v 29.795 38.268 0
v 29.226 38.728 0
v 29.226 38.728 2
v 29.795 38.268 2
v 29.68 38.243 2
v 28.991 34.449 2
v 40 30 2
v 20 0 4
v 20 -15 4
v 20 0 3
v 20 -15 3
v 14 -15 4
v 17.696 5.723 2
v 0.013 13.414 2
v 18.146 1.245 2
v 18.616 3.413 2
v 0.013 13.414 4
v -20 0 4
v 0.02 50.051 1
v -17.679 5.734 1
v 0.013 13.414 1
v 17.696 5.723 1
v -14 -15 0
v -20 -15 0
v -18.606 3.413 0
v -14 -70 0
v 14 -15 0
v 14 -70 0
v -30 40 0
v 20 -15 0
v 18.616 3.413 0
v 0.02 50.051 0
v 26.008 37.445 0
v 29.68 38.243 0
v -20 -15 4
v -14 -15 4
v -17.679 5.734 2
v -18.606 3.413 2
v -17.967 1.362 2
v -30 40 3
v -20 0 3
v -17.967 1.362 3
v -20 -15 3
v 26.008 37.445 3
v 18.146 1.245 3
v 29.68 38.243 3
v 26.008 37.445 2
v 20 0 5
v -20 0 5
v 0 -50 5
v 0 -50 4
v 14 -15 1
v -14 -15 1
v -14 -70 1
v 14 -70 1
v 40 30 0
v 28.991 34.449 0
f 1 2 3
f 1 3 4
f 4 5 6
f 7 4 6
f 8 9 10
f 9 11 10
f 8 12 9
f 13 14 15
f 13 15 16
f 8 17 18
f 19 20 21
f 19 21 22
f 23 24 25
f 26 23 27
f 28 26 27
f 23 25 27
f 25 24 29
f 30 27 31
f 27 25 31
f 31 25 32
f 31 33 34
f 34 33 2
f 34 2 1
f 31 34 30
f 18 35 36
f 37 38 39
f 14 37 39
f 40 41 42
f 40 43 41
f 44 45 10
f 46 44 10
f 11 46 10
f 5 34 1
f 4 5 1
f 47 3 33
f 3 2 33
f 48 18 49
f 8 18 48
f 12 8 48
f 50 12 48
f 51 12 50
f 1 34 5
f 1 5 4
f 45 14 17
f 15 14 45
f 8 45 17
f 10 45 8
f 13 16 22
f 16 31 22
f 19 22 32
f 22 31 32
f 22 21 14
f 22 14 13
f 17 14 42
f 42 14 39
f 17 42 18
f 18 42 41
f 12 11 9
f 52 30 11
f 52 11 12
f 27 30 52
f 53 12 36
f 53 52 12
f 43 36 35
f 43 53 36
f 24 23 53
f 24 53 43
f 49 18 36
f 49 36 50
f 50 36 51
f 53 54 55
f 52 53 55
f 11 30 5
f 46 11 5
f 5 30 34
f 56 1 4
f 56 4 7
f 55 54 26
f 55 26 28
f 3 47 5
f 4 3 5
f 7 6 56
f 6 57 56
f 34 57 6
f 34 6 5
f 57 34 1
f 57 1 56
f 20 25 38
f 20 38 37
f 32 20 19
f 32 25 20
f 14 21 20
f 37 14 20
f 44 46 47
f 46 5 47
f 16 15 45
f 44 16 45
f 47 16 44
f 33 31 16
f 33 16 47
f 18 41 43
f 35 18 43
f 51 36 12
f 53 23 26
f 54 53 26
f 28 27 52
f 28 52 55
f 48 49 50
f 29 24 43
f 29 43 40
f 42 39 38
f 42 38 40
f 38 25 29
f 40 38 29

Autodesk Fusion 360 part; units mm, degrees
sketch "Sketch1" plane through (0, 0, 0) normal (0, 0, 1) x (1, 0, 0)
  line L0 (18.6165, 3.413) -> (0.0203, 50.0507)
  line L1 (-20, 0) -> (0, -50)
  line L2 (20, 0) -> (0, -50)
  line L3 (-20, -15) -> (-14, -15)
  line L4 (-20, -15) -> (-20, -0.0774)
  line L5 (-20, -15) -> (-30, 40)
  line L6 (-20, -10) -> (-20, -20) construction
  line L7 (20, -15) -> (14, -15)
  line L8 (20, -15) -> (20, 0)
  line L9 (20, -15) -> (29.6805, 38.2428)
  line L10 (28.9908, 34.4493) -> (40, 30)
  line L11 (29.2258, 38.7285) -> (40, 30)
  line L12 (-17.9674, 1.3624) -> (-30, 40)
  line L13 (29.2258, 38.7285) -> (26.0078, 37.4454)
  line L14 (-18.606, 3.413) -> (18.6165, 3.413) construction
  line L15 (18.1455, 1.2446) -> (26.0078, 37.4454)
  line L16 (29.6805, 38.2428) -> (26.0078, 37.4454)
  line L17 (29.6805, 38.2428) -> (29.7947, 38.2676)
  line L18 (0.0129, 13.4141) -> (-20, 0)
  line L19 (0.0129, 13.4141) -> (20, 0)
  line L20 (0.0129, 13.4141) -> (-17.679, 5.7341)
  line L21 (0, 0) -> (0.219, 1.2047)
  line L22 (0.0203, 50.0507) -> (0.0052, 3.413) construction
  line L23 (0.0129, 13.4141) -> (17.6955, 5.7226)
  line L24 (-18.606, 3.413) -> (0.0203, 50.0507)
  line L25 (-20, 0) -> (-20, -0.0774)
  line L26 (-20, 0) -> (20, 0)
  line L27 (-14, -15) -> (-14, -115)
  line L28 (14, -15) -> (14, -115)
  line L29 (-14, -15) -> (14, -15)
  line L30 (-14, -115) -> (-14, -140)
  line L31 (14, -115) -> (14, -140)
  line L32 (14, -140) -> (-14, -140)
  dimension "d13" = 100
  dimension "d14" = 100
extrude "Extrude1" add sketch "Sketch1" along normal blind 1 contours L0 L20 L23 L24 makes body 1
extrude "Extrude2" add sketch "Sketch1" along normal blind 2 separate body contours L0 L15 L19 L23 | L11 L13 L16 L17 | L12 L18 L20 L24 makes body 2 at (-5.9806, 9.3969, 0.6667) makes body 3 at (27.2701, 37.7194, 1.3333)
extrude "Extrude3" add sketch "Sketch1" along normal blind 3 contours L8 L9 L15 L16 L19 | L4 L5 L12 L18 L25 bodies 3 2
extrude "Extrude4" add sketch "Sketch1" along normal blind 2 separate body contours L9 L10 L11 L17 makes body 4
extrude "Extrude5" add sketch "Sketch1" along normal blind 4 contours L18 L19 L26 | L2 L7 L8 | L1 L3 L4 L25 bodies 3 4 1
extrude "Extrude6" add sketch "Sketch1" along normal blind 5 contours L1 L2 L26 L29 | L1 L2 L29 bodies 3
sketch "Sketch2" plane through (0, 0, 0) normal (0, 0, 1) x (1, 0, 0)
sketch "Sketch3" plane through (0, 0, 0) normal (0, 0, 1) x (1, 0, 0)
  line L0 (-14, -15) -> (-14, -115)
  line L1 (-14, -15) -> (14, -15)
  line L2 (14, -15) -> (14, -115)
  line L3 (-14, -115) -> (14, -115)
  line L4 (-14, -115) -> (14, -115)
  line L5 (14, -15) -> (-14, -15)
  line L6 (-14, -115) -> (-14, -15)
  line L7 (-14, -115) -> (-14, -140)
  line L8 (14, -115) -> (14, -140)
  line L9 (14, -140) -> (-14, -140)
extrude "Extrude7" cut sketch "Sketch3" along normal blind 4 contours L0 L1 L2 L3 L4 L5 L6 bodies 3
extrude "Extrude8" add sketch "Sketch1" along normal blind 1 contours L1 L2 L27 L28 L30 L31 L32 | L1 L2 L29 bodies 3
sketch "Sketch4" plane through (0, 0, 1) normal (0, 0, 1) x (-1, 0, 0)
  line L0 (-14, 140) -> (-14, 15)
  line L1 (-14, 15) -> (14, 15)
  line L2 (14, 15) -> (14, 140)
  line L3 (20, 0) -> (0, 50)
  line L4 (-20, 0) -> (0, 50)
  line L5 (-14, 140) -> (14, 140)
  line L6 (14, 140) -> (-14, 140)
sketch "Sketch6" plane through (0, 0, 1) normal (0, 0, 1) x (-1, 0, 0)
  line L0 (14, 15) -> (14, 140)
  line L1 (14, 140) -> (-14, 140)
  line L2 (-14, 140) -> (-14, 15)
  line L3 (-14, 15) -> (14, 15)
  line L4 (0, -50) -> (0, 140)
  line L5 (0, 140) -> (0, 70)
  line L6 (14, 70) -> (-14, 70)
extrude "Extrude10" cut sketch "Sketch6" against normal blind 1 contours L0 L1 L4 L5 L6 | L1 L2 L4 L5 L6 bodies 3
sketch "Sketch5" plane through (0, 0, 1) normal (0, 0, 1) x (-1, 0, 0)
  line L0 (14, 115) -> (14, 140)
  line L1 (14, 140) -> (-14, 140)
  line L2 (-14, 140) -> (-14, 115)
  line L3 (-14, 115) -> (14, 115)
